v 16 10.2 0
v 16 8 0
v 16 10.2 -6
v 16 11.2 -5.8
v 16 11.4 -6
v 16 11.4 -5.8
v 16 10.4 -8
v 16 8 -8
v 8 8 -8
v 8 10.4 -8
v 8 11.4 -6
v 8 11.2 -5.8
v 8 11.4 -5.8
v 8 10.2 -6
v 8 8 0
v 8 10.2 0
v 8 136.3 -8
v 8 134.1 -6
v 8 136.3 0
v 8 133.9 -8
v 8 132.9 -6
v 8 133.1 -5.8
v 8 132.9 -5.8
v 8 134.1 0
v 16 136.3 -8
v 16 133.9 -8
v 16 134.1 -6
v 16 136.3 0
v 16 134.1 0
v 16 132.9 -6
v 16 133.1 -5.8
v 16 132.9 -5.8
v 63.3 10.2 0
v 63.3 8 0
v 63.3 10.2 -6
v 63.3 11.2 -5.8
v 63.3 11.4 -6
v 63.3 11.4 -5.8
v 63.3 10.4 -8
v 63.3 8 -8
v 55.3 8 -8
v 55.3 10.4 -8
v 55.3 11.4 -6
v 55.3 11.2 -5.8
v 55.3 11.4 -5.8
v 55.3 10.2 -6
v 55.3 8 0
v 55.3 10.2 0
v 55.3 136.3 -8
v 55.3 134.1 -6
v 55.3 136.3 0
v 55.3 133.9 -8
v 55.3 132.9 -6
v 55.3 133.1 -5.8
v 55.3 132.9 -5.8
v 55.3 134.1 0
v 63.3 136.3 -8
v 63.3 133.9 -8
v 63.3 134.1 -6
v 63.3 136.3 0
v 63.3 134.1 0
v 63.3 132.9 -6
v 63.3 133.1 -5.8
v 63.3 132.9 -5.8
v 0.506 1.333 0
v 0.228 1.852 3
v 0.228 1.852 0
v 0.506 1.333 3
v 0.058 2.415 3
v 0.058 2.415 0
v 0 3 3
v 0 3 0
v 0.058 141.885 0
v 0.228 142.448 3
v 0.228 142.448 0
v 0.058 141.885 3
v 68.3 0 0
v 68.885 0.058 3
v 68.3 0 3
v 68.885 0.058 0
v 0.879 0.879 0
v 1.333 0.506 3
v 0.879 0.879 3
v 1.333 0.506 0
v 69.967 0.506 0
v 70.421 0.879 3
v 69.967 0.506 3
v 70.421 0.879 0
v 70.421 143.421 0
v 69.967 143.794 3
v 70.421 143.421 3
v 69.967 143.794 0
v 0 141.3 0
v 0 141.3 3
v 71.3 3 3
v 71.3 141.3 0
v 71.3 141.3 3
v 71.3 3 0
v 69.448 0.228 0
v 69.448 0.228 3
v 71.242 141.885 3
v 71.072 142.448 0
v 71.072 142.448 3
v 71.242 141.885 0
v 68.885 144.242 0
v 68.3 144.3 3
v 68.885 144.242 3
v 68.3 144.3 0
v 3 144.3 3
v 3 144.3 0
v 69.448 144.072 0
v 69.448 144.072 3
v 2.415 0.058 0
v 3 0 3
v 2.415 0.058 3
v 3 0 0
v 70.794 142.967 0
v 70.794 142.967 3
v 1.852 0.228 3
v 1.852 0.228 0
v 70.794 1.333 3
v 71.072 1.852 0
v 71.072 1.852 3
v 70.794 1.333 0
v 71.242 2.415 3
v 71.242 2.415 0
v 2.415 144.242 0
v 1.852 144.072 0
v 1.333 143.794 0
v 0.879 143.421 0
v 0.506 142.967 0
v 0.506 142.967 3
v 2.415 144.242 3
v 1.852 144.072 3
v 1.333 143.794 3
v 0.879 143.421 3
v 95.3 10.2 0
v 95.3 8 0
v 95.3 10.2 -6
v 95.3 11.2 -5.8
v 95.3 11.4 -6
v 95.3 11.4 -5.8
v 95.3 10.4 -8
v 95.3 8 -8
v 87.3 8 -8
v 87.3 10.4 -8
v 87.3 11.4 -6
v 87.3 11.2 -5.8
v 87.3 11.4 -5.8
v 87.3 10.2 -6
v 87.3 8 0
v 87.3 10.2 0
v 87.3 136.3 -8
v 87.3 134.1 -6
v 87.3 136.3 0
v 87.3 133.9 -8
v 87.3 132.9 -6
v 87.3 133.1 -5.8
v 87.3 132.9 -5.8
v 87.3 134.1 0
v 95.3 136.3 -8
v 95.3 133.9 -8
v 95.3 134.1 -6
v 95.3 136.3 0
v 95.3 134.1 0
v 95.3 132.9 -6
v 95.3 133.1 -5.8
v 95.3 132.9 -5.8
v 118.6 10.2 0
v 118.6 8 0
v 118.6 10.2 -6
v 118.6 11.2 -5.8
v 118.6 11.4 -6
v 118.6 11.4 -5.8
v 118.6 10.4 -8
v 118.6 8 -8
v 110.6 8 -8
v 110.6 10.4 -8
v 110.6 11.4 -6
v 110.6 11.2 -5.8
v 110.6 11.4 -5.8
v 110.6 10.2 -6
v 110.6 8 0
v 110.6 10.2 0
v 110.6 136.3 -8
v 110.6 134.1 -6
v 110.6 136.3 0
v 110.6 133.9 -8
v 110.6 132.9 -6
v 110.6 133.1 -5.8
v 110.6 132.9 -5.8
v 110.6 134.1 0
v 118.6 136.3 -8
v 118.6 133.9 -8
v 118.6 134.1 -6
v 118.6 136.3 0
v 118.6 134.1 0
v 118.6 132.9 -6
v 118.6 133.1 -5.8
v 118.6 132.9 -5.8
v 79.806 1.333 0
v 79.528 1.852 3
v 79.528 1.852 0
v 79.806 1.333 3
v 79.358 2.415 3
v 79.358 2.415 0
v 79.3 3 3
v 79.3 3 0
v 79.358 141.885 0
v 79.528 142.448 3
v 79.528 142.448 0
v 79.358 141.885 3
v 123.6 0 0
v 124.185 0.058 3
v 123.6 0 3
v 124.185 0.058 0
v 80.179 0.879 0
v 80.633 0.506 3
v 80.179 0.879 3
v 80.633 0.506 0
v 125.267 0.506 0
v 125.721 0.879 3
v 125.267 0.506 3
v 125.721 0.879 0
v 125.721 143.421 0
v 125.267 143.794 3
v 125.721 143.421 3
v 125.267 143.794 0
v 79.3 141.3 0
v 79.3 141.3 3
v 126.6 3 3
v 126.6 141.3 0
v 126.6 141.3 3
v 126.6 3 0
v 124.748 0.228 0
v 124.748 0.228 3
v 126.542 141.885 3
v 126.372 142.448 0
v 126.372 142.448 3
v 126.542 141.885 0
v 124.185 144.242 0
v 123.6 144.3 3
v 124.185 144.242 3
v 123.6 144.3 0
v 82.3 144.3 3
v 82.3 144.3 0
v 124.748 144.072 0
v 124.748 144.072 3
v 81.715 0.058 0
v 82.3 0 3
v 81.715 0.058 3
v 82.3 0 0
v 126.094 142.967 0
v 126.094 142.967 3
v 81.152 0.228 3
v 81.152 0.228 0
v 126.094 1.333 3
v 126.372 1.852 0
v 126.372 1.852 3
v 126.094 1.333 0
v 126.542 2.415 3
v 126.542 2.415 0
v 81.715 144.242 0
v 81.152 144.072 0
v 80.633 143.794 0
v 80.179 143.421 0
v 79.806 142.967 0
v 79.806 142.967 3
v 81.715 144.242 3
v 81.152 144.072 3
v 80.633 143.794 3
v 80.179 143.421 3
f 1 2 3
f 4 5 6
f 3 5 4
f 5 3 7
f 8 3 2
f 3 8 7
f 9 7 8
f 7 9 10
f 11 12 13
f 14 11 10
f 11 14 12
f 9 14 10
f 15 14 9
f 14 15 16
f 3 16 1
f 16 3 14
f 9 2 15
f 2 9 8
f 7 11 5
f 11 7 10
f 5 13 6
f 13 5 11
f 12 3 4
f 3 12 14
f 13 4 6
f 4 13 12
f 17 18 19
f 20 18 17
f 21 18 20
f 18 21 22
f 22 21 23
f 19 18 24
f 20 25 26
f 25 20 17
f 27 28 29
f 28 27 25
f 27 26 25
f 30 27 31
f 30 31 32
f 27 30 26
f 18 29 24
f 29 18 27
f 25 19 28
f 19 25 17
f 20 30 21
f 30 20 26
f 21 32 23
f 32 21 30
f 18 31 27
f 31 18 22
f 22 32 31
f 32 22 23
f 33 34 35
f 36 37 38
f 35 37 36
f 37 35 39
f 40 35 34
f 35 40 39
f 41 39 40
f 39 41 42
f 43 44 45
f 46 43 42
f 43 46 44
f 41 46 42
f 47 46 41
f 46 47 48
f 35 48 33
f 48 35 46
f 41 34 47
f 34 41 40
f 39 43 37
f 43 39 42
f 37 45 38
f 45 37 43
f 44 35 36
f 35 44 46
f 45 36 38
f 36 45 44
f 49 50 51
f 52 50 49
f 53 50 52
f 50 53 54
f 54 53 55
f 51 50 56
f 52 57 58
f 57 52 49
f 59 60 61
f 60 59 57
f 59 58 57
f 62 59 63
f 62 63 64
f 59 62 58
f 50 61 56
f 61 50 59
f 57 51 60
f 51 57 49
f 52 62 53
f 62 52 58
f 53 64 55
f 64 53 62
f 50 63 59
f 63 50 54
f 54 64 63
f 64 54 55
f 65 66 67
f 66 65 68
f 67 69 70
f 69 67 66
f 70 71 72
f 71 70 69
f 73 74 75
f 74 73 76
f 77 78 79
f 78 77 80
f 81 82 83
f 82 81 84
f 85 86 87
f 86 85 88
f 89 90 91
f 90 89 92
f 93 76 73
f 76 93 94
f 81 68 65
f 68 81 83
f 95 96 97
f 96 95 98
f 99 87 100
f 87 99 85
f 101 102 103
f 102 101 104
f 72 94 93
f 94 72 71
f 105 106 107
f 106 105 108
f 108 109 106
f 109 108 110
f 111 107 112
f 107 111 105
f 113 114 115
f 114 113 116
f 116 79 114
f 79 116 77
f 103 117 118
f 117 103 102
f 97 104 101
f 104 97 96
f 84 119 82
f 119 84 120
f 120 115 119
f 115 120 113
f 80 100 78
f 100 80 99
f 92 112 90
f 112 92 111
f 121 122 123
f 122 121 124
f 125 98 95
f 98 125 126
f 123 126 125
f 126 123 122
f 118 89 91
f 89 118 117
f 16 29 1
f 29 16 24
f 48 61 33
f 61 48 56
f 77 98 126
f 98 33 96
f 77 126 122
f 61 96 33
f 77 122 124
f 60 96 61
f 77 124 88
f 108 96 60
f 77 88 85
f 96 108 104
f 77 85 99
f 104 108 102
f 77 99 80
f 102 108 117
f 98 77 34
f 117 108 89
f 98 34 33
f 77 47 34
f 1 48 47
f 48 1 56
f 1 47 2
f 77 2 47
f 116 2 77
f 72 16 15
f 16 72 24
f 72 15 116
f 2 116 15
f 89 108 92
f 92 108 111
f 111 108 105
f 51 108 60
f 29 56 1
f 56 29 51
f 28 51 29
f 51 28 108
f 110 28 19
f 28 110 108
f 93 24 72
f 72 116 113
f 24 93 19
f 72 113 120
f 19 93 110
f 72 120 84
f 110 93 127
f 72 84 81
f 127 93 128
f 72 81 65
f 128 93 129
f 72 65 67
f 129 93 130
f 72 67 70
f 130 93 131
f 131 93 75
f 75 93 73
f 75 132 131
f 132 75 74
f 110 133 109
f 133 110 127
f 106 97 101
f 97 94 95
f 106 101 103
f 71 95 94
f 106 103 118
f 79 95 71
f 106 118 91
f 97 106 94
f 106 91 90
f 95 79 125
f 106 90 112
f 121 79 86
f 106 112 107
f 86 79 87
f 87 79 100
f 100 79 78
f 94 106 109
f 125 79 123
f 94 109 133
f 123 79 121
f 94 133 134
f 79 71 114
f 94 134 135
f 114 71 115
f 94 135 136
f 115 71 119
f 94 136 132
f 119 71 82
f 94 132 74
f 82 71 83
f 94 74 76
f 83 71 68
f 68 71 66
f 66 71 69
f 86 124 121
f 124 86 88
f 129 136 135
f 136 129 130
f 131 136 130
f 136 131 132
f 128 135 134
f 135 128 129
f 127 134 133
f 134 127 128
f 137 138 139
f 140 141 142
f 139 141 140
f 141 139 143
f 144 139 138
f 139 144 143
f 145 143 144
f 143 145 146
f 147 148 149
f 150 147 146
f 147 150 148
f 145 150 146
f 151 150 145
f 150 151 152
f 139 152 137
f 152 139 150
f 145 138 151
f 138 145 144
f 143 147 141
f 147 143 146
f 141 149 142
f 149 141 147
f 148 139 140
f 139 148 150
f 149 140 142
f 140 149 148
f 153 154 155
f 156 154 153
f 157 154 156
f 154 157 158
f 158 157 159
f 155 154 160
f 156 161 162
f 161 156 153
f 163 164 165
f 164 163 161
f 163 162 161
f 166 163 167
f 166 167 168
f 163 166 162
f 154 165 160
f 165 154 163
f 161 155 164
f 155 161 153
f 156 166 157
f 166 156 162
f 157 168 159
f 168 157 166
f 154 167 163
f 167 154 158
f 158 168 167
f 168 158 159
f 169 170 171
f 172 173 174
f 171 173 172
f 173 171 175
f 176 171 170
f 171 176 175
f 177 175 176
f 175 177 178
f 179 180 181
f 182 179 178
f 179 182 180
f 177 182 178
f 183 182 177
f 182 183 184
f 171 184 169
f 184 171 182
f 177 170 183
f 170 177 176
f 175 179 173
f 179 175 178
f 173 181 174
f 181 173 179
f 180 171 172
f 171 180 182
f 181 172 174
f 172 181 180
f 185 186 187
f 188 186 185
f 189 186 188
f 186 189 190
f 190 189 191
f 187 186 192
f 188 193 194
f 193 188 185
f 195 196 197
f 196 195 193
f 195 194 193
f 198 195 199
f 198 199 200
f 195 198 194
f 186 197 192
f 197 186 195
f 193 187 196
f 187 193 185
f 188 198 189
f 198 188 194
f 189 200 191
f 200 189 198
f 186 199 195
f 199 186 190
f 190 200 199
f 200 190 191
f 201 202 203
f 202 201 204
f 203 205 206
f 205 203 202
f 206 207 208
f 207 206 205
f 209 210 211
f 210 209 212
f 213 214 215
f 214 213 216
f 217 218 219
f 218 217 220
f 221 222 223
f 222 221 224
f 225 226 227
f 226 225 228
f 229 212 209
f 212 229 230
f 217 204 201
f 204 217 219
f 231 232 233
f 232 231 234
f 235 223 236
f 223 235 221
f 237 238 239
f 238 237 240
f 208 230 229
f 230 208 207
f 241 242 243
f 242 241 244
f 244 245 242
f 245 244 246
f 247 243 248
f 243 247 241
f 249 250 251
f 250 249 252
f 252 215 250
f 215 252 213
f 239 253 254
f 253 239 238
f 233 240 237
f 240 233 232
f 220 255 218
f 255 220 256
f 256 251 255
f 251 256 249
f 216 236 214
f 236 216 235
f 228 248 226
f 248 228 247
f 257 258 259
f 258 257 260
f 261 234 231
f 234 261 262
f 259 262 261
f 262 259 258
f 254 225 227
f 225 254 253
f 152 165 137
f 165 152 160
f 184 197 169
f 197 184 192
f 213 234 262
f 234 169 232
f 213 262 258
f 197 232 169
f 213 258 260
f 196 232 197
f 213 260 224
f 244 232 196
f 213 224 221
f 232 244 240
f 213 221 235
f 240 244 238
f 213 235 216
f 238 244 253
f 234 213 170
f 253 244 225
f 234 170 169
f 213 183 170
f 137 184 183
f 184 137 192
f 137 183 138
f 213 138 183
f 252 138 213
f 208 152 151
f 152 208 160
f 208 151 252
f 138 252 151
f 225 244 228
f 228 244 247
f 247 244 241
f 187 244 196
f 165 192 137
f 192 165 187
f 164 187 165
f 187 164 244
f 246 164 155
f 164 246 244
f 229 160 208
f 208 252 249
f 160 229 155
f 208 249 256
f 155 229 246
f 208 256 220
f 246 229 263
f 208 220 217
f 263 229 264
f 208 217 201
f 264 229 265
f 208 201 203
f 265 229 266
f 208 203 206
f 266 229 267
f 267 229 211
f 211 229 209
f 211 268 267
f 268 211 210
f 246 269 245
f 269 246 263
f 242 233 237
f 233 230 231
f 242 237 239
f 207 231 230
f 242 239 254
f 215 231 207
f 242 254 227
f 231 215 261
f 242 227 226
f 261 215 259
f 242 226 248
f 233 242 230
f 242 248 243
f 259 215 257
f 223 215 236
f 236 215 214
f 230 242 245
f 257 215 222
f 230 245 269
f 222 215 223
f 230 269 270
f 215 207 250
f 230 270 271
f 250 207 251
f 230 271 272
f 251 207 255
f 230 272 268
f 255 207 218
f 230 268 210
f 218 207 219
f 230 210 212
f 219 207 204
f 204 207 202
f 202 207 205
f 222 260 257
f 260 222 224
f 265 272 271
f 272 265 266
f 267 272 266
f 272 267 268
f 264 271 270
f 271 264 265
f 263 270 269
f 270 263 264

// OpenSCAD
// file: lib/snap-interface.scad
// Hidden panel snap interface v0.1.
// Print and test the coupon before committing full panels to a printer.

snap_arm_width = 8;
snap_arm_thickness = 2.2;
snap_arm_drop = 8;
snap_barb_depth = 1.0;
snap_barb_height = 2.0;
snap_slot_clearance = 0.30;

module snap_hook() {
    // Panel underside is Z=0; hook extends downward.
    union() {
        translate([-snap_arm_width / 2, 0, -snap_arm_drop])
            cube([snap_arm_width, snap_arm_thickness, snap_arm_drop + 0.4]);
        hull() {
            translate([-snap_arm_width / 2, snap_arm_thickness, -snap_arm_drop])
                cube([snap_arm_width, 0.2, snap_barb_height]);
            translate([-snap_arm_width / 2, snap_arm_thickness + snap_barb_depth, -snap_arm_drop + snap_barb_height])
                cube([snap_arm_width, 0.2, 0.2]);
        }
    }
}

module snap_receiver_slot(depth = 8, clearance = snap_slot_clearance) {
    translate([
        -snap_arm_width / 2 - clearance,
        -0.1,
        -snap_arm_drop - clearance
    ])
        cube([
            snap_arm_width + 2 * clearance,
            depth + 0.2,
            snap_arm_drop + 2 * clearance
        ]);
}
// main file
// Two vertical snap-in rear service blanks shared by both rear-cover variants.
// Connector-specific cuts are deliberately deferred; these freeze the interface.
include <lib/snap-interface.scad>

$fn = 32;

part = "assembly"; // board-io | psu | assembly

panel_thickness = 3;
window_height = 145;
window_widths = [72, 48];
edge_clearance = 0.35;
blank_height = window_height - 2 * edge_clearance;
blank_widths = [for (w = window_widths) w - 2 * edge_clearance];

module rounded_blank(width, height, radius = 3) {
    linear_extrude(height = panel_thickness)
        hull()
            for (x = [radius, width - radius], y = [radius, height - radius])
                translate([x, y]) circle(r = radius);
}

module blank_hooks(width, height) {
    for (x = [12, width - 12]) {
        translate([x, 8, 0]) snap_hook();
        translate([x, height - 8, 0]) rotate([0, 0, 180]) snap_hook();
    }
}

module service_blank(width) {
    union() {
        rounded_blank(width, blank_height);
        blank_hooks(width, blank_height);
    }
}

if (part == "board-io")
    service_blank(blank_widths[0]);
else if (part == "psu")
    service_blank(blank_widths[1]);
else {
    color([0.18, 0.19, 0.22]) service_blank(blank_widths[0]);
    color([0.24, 0.25, 0.28])
        translate([blank_widths[0] + 8, 0, 0]) service_blank(blank_widths[1]);
}

echo("part", part);
echo("rear service blank widths/height/thickness mm",
     [blank_widths, blank_height, panel_thickness]);
echo("retention", "4 hidden hooks per blank; 0.30 mm nominal slot clearance");
assert(max(blank_widths) <= 250 && blank_height <= 250,
       "Rear service blank exceeds 250 mm print-bed target");
